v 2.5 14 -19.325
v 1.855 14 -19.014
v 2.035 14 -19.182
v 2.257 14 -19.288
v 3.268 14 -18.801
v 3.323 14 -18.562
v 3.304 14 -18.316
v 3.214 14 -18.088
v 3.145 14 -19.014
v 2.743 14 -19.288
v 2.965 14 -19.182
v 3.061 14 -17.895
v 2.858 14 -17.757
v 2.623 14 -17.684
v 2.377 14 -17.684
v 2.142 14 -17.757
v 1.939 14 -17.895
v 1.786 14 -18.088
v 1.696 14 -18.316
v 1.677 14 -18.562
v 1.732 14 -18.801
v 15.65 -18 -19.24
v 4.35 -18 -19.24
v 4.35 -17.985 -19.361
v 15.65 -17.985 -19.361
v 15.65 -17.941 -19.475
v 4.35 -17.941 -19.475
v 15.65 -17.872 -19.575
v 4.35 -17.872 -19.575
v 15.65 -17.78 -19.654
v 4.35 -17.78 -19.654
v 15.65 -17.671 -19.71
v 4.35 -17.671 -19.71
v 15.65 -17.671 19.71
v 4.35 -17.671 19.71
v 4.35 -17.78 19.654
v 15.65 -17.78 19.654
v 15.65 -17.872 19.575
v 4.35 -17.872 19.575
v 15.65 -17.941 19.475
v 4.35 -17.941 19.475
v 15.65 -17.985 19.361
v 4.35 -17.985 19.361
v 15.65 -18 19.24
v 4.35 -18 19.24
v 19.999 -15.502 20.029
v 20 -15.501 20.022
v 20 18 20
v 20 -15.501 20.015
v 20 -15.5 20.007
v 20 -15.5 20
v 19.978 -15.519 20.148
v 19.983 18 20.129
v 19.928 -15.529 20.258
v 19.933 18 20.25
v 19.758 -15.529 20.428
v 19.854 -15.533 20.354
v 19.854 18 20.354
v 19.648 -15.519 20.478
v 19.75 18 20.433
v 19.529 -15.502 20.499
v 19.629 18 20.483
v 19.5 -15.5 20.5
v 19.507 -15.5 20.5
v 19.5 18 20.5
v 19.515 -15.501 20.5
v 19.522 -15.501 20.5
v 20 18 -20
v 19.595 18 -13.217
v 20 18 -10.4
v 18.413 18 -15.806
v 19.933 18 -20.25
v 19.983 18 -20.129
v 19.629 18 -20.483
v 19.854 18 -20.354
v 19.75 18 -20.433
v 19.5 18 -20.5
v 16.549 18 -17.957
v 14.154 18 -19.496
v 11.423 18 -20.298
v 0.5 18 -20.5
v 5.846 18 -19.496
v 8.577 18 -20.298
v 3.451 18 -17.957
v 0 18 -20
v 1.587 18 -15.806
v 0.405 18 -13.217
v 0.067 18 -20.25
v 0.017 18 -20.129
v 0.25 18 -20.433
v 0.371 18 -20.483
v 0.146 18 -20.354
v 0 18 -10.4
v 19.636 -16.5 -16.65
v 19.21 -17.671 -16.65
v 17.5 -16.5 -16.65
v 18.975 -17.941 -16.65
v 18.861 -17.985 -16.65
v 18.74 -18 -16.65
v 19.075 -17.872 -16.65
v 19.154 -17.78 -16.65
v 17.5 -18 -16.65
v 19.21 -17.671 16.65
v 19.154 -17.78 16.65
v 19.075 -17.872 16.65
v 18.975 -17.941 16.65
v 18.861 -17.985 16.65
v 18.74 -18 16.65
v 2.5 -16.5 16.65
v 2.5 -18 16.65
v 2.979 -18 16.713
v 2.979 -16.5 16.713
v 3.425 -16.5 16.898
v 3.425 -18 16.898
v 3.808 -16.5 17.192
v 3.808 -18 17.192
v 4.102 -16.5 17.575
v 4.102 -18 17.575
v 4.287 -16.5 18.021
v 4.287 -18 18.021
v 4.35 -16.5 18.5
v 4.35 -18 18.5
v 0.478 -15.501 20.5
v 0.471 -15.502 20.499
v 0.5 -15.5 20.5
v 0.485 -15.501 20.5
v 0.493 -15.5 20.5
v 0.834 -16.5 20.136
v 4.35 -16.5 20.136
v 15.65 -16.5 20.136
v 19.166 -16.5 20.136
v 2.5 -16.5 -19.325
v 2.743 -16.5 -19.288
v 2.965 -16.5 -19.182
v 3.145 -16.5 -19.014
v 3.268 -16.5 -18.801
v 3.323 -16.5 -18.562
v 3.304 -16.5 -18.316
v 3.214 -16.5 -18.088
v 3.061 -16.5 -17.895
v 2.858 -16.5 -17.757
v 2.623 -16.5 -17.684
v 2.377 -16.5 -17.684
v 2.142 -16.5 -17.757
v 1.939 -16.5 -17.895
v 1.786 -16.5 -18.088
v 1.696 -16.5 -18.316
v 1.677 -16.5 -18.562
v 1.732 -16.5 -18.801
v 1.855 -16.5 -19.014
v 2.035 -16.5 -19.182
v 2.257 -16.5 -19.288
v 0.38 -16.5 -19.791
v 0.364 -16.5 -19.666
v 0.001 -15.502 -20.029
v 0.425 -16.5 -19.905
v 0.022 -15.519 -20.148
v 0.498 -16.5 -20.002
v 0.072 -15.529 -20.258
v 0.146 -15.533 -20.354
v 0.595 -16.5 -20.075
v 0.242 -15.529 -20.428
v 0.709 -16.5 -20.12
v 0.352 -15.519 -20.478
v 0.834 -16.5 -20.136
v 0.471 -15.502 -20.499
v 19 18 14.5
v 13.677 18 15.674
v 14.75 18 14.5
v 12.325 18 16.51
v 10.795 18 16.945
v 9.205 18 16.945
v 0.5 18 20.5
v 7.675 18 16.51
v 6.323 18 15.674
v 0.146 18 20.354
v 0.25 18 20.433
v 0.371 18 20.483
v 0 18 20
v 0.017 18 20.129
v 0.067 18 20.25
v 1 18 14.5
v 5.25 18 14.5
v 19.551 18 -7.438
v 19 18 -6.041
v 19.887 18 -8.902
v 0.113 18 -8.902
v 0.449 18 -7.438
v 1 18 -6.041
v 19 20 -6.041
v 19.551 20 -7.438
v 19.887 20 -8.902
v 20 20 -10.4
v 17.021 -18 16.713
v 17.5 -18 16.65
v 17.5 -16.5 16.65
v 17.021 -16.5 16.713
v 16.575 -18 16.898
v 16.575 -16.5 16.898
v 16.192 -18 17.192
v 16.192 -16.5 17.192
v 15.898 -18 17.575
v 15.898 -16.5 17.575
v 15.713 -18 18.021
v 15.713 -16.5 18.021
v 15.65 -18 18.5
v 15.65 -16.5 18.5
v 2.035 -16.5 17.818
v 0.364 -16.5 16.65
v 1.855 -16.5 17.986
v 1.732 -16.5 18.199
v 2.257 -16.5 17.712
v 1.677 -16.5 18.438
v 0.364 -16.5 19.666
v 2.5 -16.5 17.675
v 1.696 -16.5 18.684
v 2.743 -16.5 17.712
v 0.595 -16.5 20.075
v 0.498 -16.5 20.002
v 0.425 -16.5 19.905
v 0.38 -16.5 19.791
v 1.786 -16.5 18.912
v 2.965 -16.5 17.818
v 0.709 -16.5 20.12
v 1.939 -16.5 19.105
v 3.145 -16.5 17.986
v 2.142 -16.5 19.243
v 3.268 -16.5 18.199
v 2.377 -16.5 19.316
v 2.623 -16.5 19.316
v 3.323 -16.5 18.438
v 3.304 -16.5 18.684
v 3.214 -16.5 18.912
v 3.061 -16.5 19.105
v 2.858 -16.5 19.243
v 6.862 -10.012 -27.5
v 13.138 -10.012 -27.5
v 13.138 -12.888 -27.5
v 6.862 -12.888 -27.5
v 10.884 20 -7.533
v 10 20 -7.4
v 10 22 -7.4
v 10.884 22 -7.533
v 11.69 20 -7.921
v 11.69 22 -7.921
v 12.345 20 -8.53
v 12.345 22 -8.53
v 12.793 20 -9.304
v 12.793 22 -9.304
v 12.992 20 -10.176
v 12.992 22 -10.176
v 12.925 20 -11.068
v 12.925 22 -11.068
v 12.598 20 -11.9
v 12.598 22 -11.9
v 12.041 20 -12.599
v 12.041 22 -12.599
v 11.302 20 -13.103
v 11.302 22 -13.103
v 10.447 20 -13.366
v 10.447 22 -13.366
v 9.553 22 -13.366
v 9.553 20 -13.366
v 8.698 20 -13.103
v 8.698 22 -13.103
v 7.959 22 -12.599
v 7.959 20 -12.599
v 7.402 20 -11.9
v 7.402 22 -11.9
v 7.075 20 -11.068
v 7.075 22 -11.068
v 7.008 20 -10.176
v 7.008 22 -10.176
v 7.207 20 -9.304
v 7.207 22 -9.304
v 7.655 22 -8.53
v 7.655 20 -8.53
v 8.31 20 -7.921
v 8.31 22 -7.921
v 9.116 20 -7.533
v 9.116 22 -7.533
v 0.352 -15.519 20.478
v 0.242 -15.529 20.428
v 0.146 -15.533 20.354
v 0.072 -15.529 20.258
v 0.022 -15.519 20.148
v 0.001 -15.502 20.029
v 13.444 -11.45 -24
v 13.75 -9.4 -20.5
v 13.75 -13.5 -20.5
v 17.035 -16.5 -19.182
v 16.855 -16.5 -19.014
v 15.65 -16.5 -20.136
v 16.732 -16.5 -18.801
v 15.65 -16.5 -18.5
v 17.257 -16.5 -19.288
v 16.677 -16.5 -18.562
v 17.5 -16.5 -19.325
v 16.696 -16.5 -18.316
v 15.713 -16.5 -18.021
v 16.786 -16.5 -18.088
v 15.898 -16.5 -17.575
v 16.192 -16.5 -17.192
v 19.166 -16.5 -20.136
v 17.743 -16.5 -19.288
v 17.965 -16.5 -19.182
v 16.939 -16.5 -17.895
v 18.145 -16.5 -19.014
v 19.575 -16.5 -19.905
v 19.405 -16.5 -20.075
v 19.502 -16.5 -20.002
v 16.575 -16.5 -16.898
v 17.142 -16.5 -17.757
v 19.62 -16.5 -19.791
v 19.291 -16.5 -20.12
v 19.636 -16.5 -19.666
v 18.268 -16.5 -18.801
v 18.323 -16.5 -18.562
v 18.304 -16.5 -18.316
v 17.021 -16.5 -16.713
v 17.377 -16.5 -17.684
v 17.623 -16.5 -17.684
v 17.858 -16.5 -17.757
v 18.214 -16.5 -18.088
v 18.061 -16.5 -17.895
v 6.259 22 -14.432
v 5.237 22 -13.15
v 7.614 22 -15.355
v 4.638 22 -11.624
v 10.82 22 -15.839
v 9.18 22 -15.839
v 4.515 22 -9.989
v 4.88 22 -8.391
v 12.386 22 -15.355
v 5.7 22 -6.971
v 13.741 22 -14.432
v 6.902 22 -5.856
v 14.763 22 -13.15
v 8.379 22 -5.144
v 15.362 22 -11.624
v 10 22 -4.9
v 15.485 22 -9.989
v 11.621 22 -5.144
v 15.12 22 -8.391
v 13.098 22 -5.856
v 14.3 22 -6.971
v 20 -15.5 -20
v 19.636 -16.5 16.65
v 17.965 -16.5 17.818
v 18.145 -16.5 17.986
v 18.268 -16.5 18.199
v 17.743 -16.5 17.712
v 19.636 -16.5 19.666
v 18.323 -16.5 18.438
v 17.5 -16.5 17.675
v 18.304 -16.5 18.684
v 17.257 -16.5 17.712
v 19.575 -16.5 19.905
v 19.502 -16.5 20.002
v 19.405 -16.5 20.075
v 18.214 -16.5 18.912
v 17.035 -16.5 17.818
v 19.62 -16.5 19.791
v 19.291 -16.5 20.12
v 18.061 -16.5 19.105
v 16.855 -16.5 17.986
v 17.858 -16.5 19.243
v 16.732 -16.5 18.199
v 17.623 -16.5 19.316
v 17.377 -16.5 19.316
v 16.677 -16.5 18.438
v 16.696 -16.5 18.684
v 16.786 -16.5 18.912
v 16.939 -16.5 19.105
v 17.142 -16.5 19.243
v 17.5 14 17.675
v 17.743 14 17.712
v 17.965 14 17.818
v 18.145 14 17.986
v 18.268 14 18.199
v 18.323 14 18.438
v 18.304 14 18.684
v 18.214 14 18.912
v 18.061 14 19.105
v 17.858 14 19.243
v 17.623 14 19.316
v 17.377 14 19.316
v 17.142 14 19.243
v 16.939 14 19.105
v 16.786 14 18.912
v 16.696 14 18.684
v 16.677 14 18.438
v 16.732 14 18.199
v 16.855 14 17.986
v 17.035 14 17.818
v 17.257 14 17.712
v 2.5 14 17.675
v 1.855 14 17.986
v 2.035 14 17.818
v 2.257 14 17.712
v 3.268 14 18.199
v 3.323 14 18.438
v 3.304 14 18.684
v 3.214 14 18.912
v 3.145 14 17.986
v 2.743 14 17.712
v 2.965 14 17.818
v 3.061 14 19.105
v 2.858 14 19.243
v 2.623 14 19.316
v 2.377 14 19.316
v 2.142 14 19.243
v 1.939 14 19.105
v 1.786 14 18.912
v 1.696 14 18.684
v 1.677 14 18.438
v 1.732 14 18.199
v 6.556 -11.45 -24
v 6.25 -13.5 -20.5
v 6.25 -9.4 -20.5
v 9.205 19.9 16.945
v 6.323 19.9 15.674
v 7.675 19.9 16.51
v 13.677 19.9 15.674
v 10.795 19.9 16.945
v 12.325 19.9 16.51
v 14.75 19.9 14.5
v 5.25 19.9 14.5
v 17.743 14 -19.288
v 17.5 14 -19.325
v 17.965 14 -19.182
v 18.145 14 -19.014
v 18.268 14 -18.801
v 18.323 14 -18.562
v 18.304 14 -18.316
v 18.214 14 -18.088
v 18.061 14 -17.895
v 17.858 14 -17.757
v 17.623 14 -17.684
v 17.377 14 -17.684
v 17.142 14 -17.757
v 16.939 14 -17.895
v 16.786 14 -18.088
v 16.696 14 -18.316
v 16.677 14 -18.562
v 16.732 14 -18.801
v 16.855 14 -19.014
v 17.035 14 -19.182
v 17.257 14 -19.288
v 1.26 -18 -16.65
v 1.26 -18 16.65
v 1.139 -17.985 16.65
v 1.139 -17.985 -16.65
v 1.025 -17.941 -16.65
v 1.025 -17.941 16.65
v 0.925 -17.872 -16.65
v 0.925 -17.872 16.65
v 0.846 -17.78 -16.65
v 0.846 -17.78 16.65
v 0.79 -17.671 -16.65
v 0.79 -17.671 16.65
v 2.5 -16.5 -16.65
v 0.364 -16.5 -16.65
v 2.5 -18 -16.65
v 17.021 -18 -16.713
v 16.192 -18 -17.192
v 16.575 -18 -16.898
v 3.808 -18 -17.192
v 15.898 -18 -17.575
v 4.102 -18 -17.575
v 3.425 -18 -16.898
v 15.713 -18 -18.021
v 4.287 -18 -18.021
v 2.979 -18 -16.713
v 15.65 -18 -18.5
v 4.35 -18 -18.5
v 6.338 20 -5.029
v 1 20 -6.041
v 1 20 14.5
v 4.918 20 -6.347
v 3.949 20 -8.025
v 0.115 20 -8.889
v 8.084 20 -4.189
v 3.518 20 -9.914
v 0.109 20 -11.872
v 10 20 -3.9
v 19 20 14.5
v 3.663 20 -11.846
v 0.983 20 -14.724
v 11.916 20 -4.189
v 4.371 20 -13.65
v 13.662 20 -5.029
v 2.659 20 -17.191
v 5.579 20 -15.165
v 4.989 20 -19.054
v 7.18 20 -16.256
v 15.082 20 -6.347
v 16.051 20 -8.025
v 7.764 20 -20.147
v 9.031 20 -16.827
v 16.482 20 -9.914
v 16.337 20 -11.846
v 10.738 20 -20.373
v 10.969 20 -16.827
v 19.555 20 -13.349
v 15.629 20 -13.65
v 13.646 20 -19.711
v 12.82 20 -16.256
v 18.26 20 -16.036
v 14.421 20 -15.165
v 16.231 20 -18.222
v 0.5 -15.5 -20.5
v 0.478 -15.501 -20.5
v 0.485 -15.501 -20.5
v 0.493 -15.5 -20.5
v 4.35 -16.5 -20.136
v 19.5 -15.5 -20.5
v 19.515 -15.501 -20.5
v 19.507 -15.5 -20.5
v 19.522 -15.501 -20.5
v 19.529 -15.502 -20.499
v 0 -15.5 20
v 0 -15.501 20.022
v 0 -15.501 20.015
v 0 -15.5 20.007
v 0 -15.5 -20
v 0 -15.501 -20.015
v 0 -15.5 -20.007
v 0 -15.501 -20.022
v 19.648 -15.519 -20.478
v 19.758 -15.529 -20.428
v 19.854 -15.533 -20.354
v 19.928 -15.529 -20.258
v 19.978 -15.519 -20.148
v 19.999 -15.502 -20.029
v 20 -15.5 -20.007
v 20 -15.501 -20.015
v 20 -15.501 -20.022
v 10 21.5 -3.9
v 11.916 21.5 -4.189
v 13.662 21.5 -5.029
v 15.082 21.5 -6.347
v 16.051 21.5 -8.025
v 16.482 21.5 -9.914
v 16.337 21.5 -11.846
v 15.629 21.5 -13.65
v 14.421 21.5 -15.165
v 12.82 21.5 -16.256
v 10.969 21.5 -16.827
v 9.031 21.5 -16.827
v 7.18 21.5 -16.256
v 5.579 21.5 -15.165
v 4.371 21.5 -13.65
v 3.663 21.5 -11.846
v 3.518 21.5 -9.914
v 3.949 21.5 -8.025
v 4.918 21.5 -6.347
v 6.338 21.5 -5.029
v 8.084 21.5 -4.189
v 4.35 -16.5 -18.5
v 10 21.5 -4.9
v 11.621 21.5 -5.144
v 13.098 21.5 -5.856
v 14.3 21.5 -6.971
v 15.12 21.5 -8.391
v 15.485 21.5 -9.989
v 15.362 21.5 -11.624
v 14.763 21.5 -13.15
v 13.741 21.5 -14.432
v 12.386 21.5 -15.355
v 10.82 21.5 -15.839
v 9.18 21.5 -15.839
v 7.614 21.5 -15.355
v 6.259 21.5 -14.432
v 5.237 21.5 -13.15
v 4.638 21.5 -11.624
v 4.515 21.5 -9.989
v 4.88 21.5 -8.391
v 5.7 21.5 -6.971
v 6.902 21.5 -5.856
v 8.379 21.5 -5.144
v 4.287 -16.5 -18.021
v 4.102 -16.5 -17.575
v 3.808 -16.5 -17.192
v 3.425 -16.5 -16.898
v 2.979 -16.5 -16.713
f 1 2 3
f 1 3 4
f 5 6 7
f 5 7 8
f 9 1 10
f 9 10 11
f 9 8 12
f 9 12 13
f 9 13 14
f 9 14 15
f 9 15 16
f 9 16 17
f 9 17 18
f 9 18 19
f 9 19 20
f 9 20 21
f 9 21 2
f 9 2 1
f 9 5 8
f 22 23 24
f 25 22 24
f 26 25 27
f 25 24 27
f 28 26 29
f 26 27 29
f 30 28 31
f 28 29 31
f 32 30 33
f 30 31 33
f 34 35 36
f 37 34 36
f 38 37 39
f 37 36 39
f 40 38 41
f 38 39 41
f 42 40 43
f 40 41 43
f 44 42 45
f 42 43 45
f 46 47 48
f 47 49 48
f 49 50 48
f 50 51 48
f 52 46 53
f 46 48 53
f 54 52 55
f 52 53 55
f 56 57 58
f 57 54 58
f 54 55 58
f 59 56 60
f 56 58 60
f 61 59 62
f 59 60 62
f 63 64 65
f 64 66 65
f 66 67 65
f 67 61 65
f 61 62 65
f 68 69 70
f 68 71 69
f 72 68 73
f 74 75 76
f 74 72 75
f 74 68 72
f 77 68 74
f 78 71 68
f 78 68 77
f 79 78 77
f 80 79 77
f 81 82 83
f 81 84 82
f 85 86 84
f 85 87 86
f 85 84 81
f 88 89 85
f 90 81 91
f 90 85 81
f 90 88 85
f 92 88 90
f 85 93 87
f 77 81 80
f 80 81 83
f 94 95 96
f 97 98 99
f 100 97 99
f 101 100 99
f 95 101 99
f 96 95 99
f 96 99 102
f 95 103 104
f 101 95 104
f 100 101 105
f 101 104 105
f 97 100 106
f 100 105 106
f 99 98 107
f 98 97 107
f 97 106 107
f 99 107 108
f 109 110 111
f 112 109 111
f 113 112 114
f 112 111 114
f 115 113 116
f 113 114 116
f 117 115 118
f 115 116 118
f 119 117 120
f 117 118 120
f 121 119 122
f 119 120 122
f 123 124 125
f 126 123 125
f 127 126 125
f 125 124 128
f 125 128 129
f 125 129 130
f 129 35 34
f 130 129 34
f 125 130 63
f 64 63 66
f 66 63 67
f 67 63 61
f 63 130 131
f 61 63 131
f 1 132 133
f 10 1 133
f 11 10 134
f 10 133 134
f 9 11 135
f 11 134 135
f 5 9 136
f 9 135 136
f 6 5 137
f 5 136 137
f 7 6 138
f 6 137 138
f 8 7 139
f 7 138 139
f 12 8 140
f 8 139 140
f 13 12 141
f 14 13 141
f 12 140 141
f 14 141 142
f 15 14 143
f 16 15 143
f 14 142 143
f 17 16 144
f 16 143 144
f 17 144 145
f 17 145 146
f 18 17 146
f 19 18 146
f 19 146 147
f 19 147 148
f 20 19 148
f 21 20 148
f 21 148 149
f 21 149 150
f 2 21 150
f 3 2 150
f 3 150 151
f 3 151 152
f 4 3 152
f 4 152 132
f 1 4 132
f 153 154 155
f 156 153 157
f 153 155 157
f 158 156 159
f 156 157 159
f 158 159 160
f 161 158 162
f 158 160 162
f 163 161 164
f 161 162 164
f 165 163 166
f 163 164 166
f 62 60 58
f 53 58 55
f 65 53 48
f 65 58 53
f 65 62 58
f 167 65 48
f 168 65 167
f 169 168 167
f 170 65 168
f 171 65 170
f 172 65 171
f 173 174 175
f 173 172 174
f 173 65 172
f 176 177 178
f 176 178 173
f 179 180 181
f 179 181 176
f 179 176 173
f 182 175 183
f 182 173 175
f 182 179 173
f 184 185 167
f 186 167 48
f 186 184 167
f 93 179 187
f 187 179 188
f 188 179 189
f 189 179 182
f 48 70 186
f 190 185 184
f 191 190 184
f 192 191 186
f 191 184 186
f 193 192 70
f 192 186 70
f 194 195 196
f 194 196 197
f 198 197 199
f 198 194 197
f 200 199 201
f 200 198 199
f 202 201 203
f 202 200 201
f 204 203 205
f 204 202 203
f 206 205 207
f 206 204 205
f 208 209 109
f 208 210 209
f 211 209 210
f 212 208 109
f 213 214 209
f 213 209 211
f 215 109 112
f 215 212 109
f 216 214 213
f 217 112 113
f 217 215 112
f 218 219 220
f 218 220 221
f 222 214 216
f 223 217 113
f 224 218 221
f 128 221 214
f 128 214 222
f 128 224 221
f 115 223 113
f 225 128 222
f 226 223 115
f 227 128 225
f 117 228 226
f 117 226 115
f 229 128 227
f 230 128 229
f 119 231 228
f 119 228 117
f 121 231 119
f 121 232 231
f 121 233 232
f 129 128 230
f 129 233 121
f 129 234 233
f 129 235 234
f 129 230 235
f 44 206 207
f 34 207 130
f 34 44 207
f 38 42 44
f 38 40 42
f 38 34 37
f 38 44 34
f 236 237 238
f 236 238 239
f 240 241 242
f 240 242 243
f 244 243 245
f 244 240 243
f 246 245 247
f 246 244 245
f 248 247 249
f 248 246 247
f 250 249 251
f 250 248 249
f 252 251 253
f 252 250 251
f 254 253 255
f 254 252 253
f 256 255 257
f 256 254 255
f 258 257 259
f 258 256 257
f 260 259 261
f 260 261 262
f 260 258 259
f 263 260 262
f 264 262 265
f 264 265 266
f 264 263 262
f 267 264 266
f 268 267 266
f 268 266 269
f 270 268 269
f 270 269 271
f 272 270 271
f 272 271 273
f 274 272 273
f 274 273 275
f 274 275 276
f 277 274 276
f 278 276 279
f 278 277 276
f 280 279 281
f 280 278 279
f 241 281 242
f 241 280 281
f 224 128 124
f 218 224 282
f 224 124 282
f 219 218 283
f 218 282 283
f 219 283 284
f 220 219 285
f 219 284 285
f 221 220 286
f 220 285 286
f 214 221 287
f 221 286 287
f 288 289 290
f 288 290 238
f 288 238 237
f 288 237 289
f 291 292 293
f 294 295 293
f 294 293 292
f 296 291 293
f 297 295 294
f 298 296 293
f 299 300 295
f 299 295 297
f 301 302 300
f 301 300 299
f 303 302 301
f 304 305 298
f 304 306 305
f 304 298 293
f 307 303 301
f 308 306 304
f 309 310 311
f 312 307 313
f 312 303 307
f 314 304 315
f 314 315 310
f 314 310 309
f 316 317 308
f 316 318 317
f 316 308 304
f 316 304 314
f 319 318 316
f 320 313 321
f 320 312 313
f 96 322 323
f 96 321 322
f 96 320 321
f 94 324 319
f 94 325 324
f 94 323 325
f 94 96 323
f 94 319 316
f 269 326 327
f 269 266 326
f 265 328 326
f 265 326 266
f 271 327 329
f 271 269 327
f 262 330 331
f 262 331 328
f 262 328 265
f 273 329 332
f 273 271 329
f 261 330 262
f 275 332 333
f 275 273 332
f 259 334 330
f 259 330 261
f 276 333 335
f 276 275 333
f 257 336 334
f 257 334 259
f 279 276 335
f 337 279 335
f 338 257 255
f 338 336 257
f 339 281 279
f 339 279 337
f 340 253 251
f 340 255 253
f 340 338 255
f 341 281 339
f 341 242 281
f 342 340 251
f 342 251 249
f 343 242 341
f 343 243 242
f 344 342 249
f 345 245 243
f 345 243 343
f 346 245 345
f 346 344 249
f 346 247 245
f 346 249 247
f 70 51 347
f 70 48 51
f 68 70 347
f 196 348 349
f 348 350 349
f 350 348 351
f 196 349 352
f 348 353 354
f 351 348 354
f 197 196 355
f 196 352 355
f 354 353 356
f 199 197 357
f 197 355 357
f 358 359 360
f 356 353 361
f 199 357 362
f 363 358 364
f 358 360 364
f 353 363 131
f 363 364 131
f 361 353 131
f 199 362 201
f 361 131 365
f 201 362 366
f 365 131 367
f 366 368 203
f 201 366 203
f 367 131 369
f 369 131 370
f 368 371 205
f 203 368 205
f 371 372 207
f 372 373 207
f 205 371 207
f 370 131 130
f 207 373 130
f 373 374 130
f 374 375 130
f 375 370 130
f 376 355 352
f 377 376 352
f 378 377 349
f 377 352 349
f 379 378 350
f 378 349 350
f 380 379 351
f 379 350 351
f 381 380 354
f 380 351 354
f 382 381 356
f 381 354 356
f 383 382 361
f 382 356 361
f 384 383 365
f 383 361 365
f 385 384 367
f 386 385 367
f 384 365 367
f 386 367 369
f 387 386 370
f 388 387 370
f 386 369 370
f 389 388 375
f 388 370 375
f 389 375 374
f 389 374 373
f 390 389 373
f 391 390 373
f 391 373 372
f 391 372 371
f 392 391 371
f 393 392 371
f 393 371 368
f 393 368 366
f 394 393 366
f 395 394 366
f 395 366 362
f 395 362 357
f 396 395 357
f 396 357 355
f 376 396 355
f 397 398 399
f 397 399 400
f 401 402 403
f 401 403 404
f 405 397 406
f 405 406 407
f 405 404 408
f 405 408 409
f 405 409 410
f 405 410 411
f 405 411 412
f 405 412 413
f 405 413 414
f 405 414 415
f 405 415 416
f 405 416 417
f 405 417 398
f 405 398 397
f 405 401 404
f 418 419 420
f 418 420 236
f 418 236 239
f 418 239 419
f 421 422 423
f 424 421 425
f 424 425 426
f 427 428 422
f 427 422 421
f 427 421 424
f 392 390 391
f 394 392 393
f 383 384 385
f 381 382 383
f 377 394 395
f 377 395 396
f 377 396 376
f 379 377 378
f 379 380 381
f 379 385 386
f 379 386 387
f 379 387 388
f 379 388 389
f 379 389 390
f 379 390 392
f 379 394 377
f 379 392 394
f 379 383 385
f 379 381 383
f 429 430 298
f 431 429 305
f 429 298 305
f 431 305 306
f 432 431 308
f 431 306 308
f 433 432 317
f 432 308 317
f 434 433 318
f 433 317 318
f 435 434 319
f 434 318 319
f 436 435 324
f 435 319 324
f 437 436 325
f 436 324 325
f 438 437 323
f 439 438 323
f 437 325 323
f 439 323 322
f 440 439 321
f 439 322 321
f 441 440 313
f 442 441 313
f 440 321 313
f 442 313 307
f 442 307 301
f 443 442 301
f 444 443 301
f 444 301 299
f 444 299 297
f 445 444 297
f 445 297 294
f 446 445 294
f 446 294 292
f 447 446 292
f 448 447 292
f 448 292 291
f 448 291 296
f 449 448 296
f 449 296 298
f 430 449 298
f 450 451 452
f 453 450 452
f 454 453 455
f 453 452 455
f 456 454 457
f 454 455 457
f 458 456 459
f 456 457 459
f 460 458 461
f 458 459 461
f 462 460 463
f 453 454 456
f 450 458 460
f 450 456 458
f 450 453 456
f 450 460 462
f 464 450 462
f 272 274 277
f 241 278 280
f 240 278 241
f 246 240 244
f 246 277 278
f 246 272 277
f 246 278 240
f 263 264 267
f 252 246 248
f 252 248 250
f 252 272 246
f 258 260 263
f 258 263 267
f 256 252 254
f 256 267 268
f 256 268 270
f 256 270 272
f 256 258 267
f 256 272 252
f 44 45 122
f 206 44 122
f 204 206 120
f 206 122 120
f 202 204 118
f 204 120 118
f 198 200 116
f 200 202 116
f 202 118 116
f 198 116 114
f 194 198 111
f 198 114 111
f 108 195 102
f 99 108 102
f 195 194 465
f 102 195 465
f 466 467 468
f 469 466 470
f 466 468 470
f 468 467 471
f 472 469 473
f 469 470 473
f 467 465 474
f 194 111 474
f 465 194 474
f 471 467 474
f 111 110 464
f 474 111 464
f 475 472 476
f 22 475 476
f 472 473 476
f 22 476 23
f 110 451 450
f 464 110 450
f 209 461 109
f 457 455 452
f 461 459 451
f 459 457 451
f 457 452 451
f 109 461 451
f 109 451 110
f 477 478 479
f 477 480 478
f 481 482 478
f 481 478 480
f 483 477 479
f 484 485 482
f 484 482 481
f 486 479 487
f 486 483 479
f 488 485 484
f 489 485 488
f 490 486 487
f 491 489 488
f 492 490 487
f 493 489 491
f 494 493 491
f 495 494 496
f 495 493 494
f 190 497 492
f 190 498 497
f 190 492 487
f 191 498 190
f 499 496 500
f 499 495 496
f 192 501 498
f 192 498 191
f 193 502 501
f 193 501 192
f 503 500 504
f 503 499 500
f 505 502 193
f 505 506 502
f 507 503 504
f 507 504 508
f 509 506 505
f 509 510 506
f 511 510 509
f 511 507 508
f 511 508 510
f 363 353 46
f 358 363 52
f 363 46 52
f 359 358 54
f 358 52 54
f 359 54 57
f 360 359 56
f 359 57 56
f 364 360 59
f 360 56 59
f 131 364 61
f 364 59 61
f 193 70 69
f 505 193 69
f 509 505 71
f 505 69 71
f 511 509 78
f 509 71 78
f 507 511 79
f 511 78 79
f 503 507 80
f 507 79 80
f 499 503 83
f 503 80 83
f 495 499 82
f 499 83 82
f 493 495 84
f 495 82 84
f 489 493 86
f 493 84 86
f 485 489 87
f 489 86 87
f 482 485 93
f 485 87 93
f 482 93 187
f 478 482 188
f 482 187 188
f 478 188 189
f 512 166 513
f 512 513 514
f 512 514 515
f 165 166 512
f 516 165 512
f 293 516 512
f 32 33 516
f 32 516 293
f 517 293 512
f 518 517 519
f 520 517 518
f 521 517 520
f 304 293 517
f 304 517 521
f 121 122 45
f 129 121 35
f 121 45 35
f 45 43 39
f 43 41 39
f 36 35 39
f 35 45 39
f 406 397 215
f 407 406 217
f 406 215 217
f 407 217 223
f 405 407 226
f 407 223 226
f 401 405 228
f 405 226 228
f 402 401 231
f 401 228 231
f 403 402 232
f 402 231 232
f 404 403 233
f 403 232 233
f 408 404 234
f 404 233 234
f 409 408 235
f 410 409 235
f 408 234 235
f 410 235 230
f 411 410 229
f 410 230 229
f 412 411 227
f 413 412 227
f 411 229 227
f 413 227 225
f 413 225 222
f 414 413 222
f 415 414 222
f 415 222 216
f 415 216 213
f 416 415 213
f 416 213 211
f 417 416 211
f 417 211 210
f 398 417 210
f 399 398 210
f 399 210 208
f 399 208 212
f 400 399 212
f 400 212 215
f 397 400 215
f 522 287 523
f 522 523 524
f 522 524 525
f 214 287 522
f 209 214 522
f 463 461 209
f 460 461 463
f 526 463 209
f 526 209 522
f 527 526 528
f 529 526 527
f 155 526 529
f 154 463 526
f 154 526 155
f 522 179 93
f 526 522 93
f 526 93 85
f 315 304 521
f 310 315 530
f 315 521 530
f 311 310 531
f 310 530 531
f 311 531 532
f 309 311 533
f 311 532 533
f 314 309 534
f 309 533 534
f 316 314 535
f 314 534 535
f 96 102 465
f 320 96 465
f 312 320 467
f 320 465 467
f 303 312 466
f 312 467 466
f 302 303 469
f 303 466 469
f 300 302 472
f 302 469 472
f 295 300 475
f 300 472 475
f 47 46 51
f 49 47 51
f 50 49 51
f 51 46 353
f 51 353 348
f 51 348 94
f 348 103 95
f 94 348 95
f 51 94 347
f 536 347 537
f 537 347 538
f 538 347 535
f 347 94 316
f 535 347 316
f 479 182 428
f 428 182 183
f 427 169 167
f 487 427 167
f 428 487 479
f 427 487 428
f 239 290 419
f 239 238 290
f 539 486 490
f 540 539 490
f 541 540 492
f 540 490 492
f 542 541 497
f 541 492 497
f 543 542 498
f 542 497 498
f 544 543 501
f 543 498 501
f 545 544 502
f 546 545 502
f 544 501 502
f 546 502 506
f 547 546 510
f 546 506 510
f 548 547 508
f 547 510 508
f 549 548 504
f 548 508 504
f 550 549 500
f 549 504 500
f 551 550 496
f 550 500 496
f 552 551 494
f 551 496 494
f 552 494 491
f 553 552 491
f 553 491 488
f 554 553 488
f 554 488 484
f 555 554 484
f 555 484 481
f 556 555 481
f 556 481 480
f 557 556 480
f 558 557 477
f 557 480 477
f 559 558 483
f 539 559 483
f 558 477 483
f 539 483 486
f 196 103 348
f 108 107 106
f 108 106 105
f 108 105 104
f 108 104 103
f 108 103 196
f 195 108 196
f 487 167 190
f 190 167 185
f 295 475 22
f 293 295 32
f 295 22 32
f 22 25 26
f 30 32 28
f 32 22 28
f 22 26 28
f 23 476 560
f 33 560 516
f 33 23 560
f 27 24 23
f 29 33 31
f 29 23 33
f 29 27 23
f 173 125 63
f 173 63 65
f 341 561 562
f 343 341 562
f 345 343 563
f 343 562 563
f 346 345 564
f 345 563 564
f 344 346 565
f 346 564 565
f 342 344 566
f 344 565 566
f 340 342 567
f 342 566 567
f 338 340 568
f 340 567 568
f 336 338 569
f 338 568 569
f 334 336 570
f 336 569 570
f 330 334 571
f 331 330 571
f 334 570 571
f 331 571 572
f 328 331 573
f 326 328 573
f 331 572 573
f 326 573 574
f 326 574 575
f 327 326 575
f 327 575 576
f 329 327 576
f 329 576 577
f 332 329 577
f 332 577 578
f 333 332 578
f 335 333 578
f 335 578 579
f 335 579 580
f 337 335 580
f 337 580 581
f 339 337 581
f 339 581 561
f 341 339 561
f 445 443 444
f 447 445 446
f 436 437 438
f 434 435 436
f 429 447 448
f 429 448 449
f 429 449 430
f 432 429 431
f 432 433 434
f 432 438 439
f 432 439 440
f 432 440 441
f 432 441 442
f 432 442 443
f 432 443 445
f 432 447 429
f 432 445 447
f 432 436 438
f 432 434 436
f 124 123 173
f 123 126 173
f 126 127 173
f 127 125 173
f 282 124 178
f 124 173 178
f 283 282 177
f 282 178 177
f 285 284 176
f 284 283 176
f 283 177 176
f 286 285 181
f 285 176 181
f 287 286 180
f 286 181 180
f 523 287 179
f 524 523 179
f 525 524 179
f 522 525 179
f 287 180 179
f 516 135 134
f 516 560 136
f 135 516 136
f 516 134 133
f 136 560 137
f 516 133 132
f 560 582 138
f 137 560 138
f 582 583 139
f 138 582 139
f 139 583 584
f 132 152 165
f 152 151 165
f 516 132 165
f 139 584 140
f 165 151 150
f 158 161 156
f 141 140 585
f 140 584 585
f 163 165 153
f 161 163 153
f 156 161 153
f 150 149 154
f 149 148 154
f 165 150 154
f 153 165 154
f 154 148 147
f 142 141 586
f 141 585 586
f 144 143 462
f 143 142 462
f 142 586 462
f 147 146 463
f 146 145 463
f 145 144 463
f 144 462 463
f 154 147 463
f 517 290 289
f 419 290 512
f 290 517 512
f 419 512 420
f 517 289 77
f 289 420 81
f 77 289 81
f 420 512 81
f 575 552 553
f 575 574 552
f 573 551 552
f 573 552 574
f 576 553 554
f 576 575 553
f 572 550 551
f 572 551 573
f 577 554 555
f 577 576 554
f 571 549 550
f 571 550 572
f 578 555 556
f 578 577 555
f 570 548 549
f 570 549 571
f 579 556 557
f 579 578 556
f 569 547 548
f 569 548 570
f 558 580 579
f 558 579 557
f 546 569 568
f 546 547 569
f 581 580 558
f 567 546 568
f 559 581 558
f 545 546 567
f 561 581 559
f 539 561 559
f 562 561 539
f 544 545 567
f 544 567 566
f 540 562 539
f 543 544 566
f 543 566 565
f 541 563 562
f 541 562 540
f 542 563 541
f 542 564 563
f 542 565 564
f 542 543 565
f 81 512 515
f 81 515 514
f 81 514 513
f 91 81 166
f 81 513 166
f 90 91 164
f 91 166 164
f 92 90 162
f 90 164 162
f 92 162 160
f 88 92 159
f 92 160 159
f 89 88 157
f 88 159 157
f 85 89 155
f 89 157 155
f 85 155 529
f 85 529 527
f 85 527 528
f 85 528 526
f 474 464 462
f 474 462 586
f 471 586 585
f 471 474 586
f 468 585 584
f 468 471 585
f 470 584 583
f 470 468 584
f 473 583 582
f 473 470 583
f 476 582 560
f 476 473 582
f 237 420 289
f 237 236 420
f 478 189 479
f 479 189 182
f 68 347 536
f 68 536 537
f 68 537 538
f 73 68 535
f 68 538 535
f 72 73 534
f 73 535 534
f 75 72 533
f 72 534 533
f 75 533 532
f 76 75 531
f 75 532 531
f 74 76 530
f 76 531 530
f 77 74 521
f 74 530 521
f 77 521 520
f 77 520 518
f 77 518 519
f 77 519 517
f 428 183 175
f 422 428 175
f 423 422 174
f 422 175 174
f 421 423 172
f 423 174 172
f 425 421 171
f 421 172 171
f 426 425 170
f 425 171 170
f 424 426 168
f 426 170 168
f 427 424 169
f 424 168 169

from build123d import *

# Parameters (mm, degrees)
SKETCH1_W             = 41
SKETCH1_H             = 36
BOSS_EXTRUDE1_DEPTH   = 20
BOSS_EXTRUDE2_DEPTH   = 2
BOSS_EXTRUDE3_DEPTH   = 1.9
SKETCH3_R             = 6.5
SKETCH3_R_2           = 5.5
BOSS_EXTRUDE4_DEPTH   = 1.5
SKETCH3_3_R           = 5.5
SKETCH3_3_R_2         = 3
BOSS_EXTRUDE5_DEPTH   = 2
SKETCH10_R            = 0.825
CUT_EXTRUDE3_DEPTH    = 1.5
SKETCH10_10_R         = 0.825
CUT_EXTRUDE4_DEPTH    = 32
CHAMFER2_SIZE         = 2.5
CHAMFER2_SIZE2        = 0.909925586
CHAMFER2_PART_2_SIZE  = 2.5
CHAMFER2_PART_2_SIZE2 = 0.909925586
CHAMFER2_PART_3_SIZE  = 2.5
CHAMFER2_PART_3_SIZE2 = 0.909925586
CHAMFER2_PART_4_SIZE  = 2.5
CHAMFER2_PART_4_SIZE2 = 0.909925586
FILLET2_R             = 0.5
SKETCH11_W            = 7.5
SKETCH11_H            = 4.1
BOSS_EXTRUDE10_DEPTH  = 7
BOSS_EXTRUDE10_TAPER  = 5


with BuildPart() as part:
    # Sketch1 → Boss-Extrude1 (new body)
    with BuildSketch(Plane(origin=(0, 0, 0), x_dir=(0, 0, -1), z_dir=(1, 0, 0))):
        Rectangle(SKETCH1_W, SKETCH1_H)
    extrude(amount=BOSS_EXTRUDE1_DEPTH)

    # Sketch2 → Boss-Extrude2 (add)
    with BuildSketch(Plane(origin=(0, 18, 0), x_dir=(1, 0, 0), z_dir=(0, 1, 0))):
        with BuildLine():
            ThreePointArc((20, 10.4), (7.763932023, 20.146794345), (1, 6.041101056))
            Line((1, 6.041101056), (1, 10.5))
            Line((1, 10.5), (19, 10.5))
            Line((19, 10.5), (19, 6.041101056))
            ThreePointArc((19, 6.041101056), (19.746794345, 8.163932022), (20, 10.4))
        make_face()
        with BuildLine():
            Line((1, 10.5), (1, 6.041101056))
            ThreePointArc((1, 6.041101056), (10, 0.4), (19, 6.041101056))
            Line((19, 6.041101056), (19, 10.5))
            Line((19, 10.5), (1, 10.5))
        make_face()
        with BuildLine():
            Line((1, 6.041101056), (1, -14.5))
            Line((1, -14.5), (5.25, -14.5))
            Line((5.25, -14.5), (14.75, -14.5))
            Line((14.75, -14.5), (19, -14.5))
            Line((19, -14.5), (19, 6.041101056))
            ThreePointArc((19, 6.041101056), (10, 0.4), (1, 6.041101056))
        make_face()
    extrude(amount=BOSS_EXTRUDE2_DEPTH)

    # Sketch2<3> → Boss-Extrude3 (add)
    with BuildSketch(Plane(origin=(0, 18, 0), x_dir=(1, 0, 0), z_dir=(0, 1, 0))):
        with BuildLine():
            Line((14.75, -14.5), (5.25, -14.5))
            ThreePointArc((5.25, -14.5), (10, -17), (14.75, -14.5))
        make_face()
    extrude(amount=BOSS_EXTRUDE3_DEPTH)

    # Sketch3 → Boss-Extrude4 (add)
    with BuildSketch(Plane(origin=(0, 20, 0), x_dir=(1, 0, 0), z_dir=(0, 1, 0))):
        with Locations(Location((10, 10.4, 0), (0, 0, 270))):
            Circle(SKETCH3_R)
        with Locations(Location((10, 10.4, 0), (0, 0, 270))):
            Circle(SKETCH3_R_2, mode=Mode.SUBTRACT)
    extrude(amount=BOSS_EXTRUDE4_DEPTH)

    # Sketch3<3> → Boss-Extrude5 (add)
    with BuildSketch(Plane(origin=(0, 20, 0), x_dir=(1, 0, 0), z_dir=(0, 1, 0))):
        with Locations(Location((10, 10.4, 0), (0, 0, 270))):
            Circle(SKETCH3_3_R)
        with Locations(Location((10, 10.4, 0), (0, 0, 270))):
            Circle(SKETCH3_3_R_2, mode=Mode.SUBTRACT)
    extrude(amount=BOSS_EXTRUDE5_DEPTH)

    # Sketch10 → Cut-Extrude3 (cut)
    # profile 1 of 4: a face of its own
    with BuildSketch(Plane.XZ.offset(18)):
        with BuildLine():
            Line((0, 16.65), (2.5, 16.65))
            ThreePointArc((2.5, 16.65), (3.808147545, 17.191852455), (4.35, 18.5))
            Line((4.35, 18.5), (4.35, 20.5))
            Line((4.35, 20.5), (0, 20.5))
            Line((0, 20.5), (0, 16.65))
        make_face()
        with Locations(Location((2.5, 18.5, 0), (0, 0, 270))):
            Circle(SKETCH10_R, mode=Mode.SUBTRACT)
    # profile 2 of 4: a face of its own
    with BuildSketch(Plane.XZ.offset(18)):
        with BuildLine():
            Line((15.65, 18.5), (15.65, 20.5))
            Line((15.65, 20.5), (20, 20.5))
            Line((20, 20.5), (20, 16.65))
            Line((20, 16.65), (17.5, 16.65))
            ThreePointArc((17.5, 16.65), (16.191852455, 17.191852455), (15.65, 18.5))
        make_face()
        with Locations(Location((17.5, 18.5, 0), (0, 0, 90))):
            Circle(SKETCH10_R, mode=Mode.SUBTRACT)
    # profile 3 of 4: a face of its own
    with BuildSketch(Plane.XZ.offset(18)):
        with BuildLine():
            Line((4.35, -18.5), (4.35, -20.5))
            Line((4.35, -20.5), (0, -20.5))
            Line((0, -20.5), (0, -16.65))
            Line((0, -16.65), (2.5, -16.65))
            ThreePointArc((2.5, -16.65), (3.808147545, -17.191852455), (4.35, -18.5))
        make_face()
        with Locations(Location((2.5, -18.5, 0), (0, 0, 90))):
            Circle(SKETCH10_R, mode=Mode.SUBTRACT)
    # profile 4 of 4: a face of its own
    with BuildSketch(Plane.XZ.offset(18)):
        with BuildLine():
            Line((20, -16.65), (17.5, -16.65))
            ThreePointArc((17.5, -16.65), (16.191852455, -17.191852455), (15.65, -18.5))
            Line((15.65, -18.5), (15.65, -20.5))
            Line((15.65, -20.5), (20, -20.5))
            Line((20, -20.5), (20, -16.65))
        make_face()
        with Locations(Location((17.5, -18.5, 0), (0, 0, 270))):
            Circle(SKETCH10_R, mode=Mode.SUBTRACT)
    extrude(amount=-CUT_EXTRUDE3_DEPTH, mode=Mode.SUBTRACT)

    # Sketch10<10> → Cut-Extrude4 (cut)
    with BuildSketch(Plane.XZ.offset(18)):
        with Locations(Location((2.5, 18.5, 0), (0, 0, 270))):
            Circle(SKETCH10_10_R)
        with Locations(Location((17.5, 18.5, 0), (0, 0, 270))):
            Circle(SKETCH10_10_R)
        with Locations(Location((17.5, -18.5, 0), (0, 0, 270))):
            Circle(SKETCH10_10_R)
        with Locations(Location((2.5, -18.5, 0), (0, 0, 270))):
            Circle(SKETCH10_10_R)
    extrude(amount=-CUT_EXTRUDE4_DEPTH, mode=Mode.SUBTRACT)

    # Chamfer2
    chamfer2_edges = [part.edges().sort_by_distance(p)[0] for p in [
        (10, -18, 20.5),
    ]]
    chamfer2_side = [part.faces().sort_by_distance(p)[0] for p in [
        (10, 0.318427753, 20.5),
    ]]
    chamfer(chamfer2_edges, length=CHAMFER2_SIZE, length2=CHAMFER2_SIZE2, reference=chamfer2_side[0])

    # Chamfer2 part 2
    chamfer2_part_2_edges = [part.edges().sort_by_distance(p)[0] for p in [
        (20, -18, 0),
    ]]
    chamfer2_part_2_side = [part.faces().sort_by_distance(p)[0] for p in [
        (20, 0.13604937, 0),
    ]]
    chamfer(chamfer2_part_2_edges, length=CHAMFER2_PART_2_SIZE, length2=CHAMFER2_PART_2_SIZE2, reference=chamfer2_part_2_side[0])

    # Chamfer2 part 3
    chamfer2_part_3_edges = [part.edges().sort_by_distance(p)[0] for p in [
        (10, -18, -20.5),
    ]]
    chamfer2_part_3_side = [part.faces().sort_by_distance(p)[0] for p in [
        (10, 0.318427753, -20.5),
    ]]
    chamfer(chamfer2_part_3_edges, length=CHAMFER2_PART_3_SIZE, length2=CHAMFER2_PART_3_SIZE2, reference=chamfer2_part_3_side[0])

    # Chamfer2 part 4
    chamfer2_part_4_edges = [part.edges().sort_by_distance(p)[0] for p in [
        (0, -18, 0),
    ]]
    chamfer2_part_4_side = [part.faces().sort_by_distance(p)[0] for p in [
        (0, 0.13604937, 0),
    ]]
    chamfer(chamfer2_part_4_edges, length=CHAMFER2_PART_4_SIZE, length2=CHAMFER2_PART_4_SIZE2, reference=chamfer2_part_4_side[0])

    # Fillet2
    # the kernel refuses this fillet: 0.5 mm, written as the material it takes off along each edge
    with BuildSketch(Plane(origin=(20, 19.25, 20.5), x_dir=(-1, 0, 0), z_dir=(0, -1, 0)), Plane(origin=(0, -16.75, -20.5), x_dir=(0, 0, 1), z_dir=(0, 1, 0)), Plane(origin=(20, -16.75, -20.5), x_dir=(-1, 0, 0), z_dir=(0, 1, 0)), Plane(origin=(0, 19.25, 20.5), x_dir=(0, 0, -1), z_dir=(0, -1, 0))) as fillet2_piece_1:
        with BuildLine():
            CenterArc((FILLET2_R, FILLET2_R), FILLET2_R, 180, 90)
            Line((0, FILLET2_R), (0, 0))
            Line((0, 0), (FILLET2_R, 0))
        make_face()
    extrude(amount=36, mode=Mode.SUBTRACT)
    with BuildSketch(Plane(origin=(19.090074414, -18, 17.525259423), x_dir=(-1, 0, 0), z_dir=(0, 0, -1))) as fillet2_piece_2:
        with BuildLine():
            CenterArc((FILLET2_R * 0.70020753821, FILLET2_R), FILLET2_R, 200, 70)
            Line((-FILLET2_R * 0.239485082576, FILLET2_R * 0.657979856674), (0, 0))
            Line((0, 0), (FILLET2_R * 0.70020753821, 0))
        make_face()
    extrude(amount=35.050518846, mode=Mode.SUBTRACT)
    with BuildSketch(Plane(origin=(3.474740577, -18, 19.590074414), x_dir=(0, 0, -1), z_dir=(1, 0, 0))) as fillet2_piece_3:
        with BuildLine():
            CenterArc((FILLET2_R * 0.70020753821, FILLET2_R), FILLET2_R, 200, 70)
            Line((-FILLET2_R * 0.239485082576, FILLET2_R * 0.657979856674), (0, 0))
            Line((0, 0), (FILLET2_R * 0.70020753821, 0))
        make_face()
    extrude(amount=13.050518846, mode=Mode.SUBTRACT)
    with BuildSketch(Plane(origin=(0.909925586, -18, 17.525259423), x_dir=(1, 0, 0), z_dir=(0, 0, -1))) as fillet2_piece_4:
        with BuildLine():
            CenterArc((FILLET2_R * 0.70020753821, -FILLET2_R), FILLET2_R, 90, 70)
            Line((-FILLET2_R * 0.239485082576, -FILLET2_R * 0.657979856674), (0, 0))
            Line((0, 0), (FILLET2_R * 0.70020753821, 0))
        make_face()
    extrude(amount=35.050518846, mode=Mode.SUBTRACT)
    with BuildSketch(Plane(origin=(3.474740577, -18, -19.590074414), x_dir=(0, 0, 1), z_dir=(1, 0, 0))) as fillet2_piece_5:
        with BuildLine():
            CenterArc((FILLET2_R * 0.70020753821, -FILLET2_R), FILLET2_R, 90, 70)
            Line((-FILLET2_R * 0.239485082576, -FILLET2_R * 0.657979856674), (0, 0))
            Line((0, 0), (FILLET2_R * 0.70020753821, 0))
        make_face()
    extrude(amount=13.050518846, mode=Mode.SUBTRACT)
    with BuildSketch(Plane(origin=(20.359668978, -14.511817604, 20.859668978), x_dir=(-0.9461886483394649, 0.3040991697893318, 0.1106830460683808), z_dir=(-0.3236155771181854, -0.8891264907159879, -0.3236155771181854)), Plane(origin=(-0.359668978, -14.511817604, 20.859668978), x_dir=(-0.11068304606838054, 0.30409916978933194, -0.9461886483394649), z_dir=(0.3236155771181852, -0.8891264907159879, -0.32361557711818534))) as fillet2_piece_6:
        with BuildLine():
            CenterArc((FILLET2_R * 0.889126490716, FILLET2_R), FILLET2_R, 186.717713464, 83.282286536)
            Line((-FILLET2_R * 0.104008041637, FILLET2_R * 0.883022221559), (0, 0))
            Line((0, 0), (FILLET2_R * 0.889126490716, 0))
        make_face()
    extrude(amount=3.347515592, mode=Mode.SUBTRACT)
    with BuildSketch(Plane(origin=(20.359668978, -14.511817604, -20.859668978), x_dir=(-0.9461886483394651, 0.3040991697893314, -0.1106830460683821), z_dir=(-0.3236155771181854, -0.8891264907159879, 0.3236155771181854)), Plane(origin=(-0.359668978, -14.511817604, -20.859668978), x_dir=(-0.11068304606838054, 0.30409916978933194, 0.946188648339465), z_dir=(0.3236155771181852, -0.8891264907159879, 0.32361557711818534))) as fillet2_piece_7:
        with BuildLine():
            CenterArc((FILLET2_R * 0.889126490716, -FILLET2_R), FILLET2_R, 90, 83.282286536)
            Line((-FILLET2_R * 0.104008041637, -FILLET2_R * 0.883022221559), (0, 0))
            Line((0, 0), (FILLET2_R * 0.889126490716, 0))
        make_face()
    extrude(amount=3.347515592, mode=Mode.SUBTRACT)

    # Sketch11 → Boss-Extrude10 (add)
    with BuildSketch(Plane(origin=(0, 0, -20.5), x_dir=(-1, 0, 0), z_dir=(0, 0, -1))):
        with Locations((-10, -11.45)):
            Rectangle(SKETCH11_W, SKETCH11_H)
    extrude(amount=BOSS_EXTRUDE10_DEPTH, taper=BOSS_EXTRUDE10_TAPER)


solid = part.part
